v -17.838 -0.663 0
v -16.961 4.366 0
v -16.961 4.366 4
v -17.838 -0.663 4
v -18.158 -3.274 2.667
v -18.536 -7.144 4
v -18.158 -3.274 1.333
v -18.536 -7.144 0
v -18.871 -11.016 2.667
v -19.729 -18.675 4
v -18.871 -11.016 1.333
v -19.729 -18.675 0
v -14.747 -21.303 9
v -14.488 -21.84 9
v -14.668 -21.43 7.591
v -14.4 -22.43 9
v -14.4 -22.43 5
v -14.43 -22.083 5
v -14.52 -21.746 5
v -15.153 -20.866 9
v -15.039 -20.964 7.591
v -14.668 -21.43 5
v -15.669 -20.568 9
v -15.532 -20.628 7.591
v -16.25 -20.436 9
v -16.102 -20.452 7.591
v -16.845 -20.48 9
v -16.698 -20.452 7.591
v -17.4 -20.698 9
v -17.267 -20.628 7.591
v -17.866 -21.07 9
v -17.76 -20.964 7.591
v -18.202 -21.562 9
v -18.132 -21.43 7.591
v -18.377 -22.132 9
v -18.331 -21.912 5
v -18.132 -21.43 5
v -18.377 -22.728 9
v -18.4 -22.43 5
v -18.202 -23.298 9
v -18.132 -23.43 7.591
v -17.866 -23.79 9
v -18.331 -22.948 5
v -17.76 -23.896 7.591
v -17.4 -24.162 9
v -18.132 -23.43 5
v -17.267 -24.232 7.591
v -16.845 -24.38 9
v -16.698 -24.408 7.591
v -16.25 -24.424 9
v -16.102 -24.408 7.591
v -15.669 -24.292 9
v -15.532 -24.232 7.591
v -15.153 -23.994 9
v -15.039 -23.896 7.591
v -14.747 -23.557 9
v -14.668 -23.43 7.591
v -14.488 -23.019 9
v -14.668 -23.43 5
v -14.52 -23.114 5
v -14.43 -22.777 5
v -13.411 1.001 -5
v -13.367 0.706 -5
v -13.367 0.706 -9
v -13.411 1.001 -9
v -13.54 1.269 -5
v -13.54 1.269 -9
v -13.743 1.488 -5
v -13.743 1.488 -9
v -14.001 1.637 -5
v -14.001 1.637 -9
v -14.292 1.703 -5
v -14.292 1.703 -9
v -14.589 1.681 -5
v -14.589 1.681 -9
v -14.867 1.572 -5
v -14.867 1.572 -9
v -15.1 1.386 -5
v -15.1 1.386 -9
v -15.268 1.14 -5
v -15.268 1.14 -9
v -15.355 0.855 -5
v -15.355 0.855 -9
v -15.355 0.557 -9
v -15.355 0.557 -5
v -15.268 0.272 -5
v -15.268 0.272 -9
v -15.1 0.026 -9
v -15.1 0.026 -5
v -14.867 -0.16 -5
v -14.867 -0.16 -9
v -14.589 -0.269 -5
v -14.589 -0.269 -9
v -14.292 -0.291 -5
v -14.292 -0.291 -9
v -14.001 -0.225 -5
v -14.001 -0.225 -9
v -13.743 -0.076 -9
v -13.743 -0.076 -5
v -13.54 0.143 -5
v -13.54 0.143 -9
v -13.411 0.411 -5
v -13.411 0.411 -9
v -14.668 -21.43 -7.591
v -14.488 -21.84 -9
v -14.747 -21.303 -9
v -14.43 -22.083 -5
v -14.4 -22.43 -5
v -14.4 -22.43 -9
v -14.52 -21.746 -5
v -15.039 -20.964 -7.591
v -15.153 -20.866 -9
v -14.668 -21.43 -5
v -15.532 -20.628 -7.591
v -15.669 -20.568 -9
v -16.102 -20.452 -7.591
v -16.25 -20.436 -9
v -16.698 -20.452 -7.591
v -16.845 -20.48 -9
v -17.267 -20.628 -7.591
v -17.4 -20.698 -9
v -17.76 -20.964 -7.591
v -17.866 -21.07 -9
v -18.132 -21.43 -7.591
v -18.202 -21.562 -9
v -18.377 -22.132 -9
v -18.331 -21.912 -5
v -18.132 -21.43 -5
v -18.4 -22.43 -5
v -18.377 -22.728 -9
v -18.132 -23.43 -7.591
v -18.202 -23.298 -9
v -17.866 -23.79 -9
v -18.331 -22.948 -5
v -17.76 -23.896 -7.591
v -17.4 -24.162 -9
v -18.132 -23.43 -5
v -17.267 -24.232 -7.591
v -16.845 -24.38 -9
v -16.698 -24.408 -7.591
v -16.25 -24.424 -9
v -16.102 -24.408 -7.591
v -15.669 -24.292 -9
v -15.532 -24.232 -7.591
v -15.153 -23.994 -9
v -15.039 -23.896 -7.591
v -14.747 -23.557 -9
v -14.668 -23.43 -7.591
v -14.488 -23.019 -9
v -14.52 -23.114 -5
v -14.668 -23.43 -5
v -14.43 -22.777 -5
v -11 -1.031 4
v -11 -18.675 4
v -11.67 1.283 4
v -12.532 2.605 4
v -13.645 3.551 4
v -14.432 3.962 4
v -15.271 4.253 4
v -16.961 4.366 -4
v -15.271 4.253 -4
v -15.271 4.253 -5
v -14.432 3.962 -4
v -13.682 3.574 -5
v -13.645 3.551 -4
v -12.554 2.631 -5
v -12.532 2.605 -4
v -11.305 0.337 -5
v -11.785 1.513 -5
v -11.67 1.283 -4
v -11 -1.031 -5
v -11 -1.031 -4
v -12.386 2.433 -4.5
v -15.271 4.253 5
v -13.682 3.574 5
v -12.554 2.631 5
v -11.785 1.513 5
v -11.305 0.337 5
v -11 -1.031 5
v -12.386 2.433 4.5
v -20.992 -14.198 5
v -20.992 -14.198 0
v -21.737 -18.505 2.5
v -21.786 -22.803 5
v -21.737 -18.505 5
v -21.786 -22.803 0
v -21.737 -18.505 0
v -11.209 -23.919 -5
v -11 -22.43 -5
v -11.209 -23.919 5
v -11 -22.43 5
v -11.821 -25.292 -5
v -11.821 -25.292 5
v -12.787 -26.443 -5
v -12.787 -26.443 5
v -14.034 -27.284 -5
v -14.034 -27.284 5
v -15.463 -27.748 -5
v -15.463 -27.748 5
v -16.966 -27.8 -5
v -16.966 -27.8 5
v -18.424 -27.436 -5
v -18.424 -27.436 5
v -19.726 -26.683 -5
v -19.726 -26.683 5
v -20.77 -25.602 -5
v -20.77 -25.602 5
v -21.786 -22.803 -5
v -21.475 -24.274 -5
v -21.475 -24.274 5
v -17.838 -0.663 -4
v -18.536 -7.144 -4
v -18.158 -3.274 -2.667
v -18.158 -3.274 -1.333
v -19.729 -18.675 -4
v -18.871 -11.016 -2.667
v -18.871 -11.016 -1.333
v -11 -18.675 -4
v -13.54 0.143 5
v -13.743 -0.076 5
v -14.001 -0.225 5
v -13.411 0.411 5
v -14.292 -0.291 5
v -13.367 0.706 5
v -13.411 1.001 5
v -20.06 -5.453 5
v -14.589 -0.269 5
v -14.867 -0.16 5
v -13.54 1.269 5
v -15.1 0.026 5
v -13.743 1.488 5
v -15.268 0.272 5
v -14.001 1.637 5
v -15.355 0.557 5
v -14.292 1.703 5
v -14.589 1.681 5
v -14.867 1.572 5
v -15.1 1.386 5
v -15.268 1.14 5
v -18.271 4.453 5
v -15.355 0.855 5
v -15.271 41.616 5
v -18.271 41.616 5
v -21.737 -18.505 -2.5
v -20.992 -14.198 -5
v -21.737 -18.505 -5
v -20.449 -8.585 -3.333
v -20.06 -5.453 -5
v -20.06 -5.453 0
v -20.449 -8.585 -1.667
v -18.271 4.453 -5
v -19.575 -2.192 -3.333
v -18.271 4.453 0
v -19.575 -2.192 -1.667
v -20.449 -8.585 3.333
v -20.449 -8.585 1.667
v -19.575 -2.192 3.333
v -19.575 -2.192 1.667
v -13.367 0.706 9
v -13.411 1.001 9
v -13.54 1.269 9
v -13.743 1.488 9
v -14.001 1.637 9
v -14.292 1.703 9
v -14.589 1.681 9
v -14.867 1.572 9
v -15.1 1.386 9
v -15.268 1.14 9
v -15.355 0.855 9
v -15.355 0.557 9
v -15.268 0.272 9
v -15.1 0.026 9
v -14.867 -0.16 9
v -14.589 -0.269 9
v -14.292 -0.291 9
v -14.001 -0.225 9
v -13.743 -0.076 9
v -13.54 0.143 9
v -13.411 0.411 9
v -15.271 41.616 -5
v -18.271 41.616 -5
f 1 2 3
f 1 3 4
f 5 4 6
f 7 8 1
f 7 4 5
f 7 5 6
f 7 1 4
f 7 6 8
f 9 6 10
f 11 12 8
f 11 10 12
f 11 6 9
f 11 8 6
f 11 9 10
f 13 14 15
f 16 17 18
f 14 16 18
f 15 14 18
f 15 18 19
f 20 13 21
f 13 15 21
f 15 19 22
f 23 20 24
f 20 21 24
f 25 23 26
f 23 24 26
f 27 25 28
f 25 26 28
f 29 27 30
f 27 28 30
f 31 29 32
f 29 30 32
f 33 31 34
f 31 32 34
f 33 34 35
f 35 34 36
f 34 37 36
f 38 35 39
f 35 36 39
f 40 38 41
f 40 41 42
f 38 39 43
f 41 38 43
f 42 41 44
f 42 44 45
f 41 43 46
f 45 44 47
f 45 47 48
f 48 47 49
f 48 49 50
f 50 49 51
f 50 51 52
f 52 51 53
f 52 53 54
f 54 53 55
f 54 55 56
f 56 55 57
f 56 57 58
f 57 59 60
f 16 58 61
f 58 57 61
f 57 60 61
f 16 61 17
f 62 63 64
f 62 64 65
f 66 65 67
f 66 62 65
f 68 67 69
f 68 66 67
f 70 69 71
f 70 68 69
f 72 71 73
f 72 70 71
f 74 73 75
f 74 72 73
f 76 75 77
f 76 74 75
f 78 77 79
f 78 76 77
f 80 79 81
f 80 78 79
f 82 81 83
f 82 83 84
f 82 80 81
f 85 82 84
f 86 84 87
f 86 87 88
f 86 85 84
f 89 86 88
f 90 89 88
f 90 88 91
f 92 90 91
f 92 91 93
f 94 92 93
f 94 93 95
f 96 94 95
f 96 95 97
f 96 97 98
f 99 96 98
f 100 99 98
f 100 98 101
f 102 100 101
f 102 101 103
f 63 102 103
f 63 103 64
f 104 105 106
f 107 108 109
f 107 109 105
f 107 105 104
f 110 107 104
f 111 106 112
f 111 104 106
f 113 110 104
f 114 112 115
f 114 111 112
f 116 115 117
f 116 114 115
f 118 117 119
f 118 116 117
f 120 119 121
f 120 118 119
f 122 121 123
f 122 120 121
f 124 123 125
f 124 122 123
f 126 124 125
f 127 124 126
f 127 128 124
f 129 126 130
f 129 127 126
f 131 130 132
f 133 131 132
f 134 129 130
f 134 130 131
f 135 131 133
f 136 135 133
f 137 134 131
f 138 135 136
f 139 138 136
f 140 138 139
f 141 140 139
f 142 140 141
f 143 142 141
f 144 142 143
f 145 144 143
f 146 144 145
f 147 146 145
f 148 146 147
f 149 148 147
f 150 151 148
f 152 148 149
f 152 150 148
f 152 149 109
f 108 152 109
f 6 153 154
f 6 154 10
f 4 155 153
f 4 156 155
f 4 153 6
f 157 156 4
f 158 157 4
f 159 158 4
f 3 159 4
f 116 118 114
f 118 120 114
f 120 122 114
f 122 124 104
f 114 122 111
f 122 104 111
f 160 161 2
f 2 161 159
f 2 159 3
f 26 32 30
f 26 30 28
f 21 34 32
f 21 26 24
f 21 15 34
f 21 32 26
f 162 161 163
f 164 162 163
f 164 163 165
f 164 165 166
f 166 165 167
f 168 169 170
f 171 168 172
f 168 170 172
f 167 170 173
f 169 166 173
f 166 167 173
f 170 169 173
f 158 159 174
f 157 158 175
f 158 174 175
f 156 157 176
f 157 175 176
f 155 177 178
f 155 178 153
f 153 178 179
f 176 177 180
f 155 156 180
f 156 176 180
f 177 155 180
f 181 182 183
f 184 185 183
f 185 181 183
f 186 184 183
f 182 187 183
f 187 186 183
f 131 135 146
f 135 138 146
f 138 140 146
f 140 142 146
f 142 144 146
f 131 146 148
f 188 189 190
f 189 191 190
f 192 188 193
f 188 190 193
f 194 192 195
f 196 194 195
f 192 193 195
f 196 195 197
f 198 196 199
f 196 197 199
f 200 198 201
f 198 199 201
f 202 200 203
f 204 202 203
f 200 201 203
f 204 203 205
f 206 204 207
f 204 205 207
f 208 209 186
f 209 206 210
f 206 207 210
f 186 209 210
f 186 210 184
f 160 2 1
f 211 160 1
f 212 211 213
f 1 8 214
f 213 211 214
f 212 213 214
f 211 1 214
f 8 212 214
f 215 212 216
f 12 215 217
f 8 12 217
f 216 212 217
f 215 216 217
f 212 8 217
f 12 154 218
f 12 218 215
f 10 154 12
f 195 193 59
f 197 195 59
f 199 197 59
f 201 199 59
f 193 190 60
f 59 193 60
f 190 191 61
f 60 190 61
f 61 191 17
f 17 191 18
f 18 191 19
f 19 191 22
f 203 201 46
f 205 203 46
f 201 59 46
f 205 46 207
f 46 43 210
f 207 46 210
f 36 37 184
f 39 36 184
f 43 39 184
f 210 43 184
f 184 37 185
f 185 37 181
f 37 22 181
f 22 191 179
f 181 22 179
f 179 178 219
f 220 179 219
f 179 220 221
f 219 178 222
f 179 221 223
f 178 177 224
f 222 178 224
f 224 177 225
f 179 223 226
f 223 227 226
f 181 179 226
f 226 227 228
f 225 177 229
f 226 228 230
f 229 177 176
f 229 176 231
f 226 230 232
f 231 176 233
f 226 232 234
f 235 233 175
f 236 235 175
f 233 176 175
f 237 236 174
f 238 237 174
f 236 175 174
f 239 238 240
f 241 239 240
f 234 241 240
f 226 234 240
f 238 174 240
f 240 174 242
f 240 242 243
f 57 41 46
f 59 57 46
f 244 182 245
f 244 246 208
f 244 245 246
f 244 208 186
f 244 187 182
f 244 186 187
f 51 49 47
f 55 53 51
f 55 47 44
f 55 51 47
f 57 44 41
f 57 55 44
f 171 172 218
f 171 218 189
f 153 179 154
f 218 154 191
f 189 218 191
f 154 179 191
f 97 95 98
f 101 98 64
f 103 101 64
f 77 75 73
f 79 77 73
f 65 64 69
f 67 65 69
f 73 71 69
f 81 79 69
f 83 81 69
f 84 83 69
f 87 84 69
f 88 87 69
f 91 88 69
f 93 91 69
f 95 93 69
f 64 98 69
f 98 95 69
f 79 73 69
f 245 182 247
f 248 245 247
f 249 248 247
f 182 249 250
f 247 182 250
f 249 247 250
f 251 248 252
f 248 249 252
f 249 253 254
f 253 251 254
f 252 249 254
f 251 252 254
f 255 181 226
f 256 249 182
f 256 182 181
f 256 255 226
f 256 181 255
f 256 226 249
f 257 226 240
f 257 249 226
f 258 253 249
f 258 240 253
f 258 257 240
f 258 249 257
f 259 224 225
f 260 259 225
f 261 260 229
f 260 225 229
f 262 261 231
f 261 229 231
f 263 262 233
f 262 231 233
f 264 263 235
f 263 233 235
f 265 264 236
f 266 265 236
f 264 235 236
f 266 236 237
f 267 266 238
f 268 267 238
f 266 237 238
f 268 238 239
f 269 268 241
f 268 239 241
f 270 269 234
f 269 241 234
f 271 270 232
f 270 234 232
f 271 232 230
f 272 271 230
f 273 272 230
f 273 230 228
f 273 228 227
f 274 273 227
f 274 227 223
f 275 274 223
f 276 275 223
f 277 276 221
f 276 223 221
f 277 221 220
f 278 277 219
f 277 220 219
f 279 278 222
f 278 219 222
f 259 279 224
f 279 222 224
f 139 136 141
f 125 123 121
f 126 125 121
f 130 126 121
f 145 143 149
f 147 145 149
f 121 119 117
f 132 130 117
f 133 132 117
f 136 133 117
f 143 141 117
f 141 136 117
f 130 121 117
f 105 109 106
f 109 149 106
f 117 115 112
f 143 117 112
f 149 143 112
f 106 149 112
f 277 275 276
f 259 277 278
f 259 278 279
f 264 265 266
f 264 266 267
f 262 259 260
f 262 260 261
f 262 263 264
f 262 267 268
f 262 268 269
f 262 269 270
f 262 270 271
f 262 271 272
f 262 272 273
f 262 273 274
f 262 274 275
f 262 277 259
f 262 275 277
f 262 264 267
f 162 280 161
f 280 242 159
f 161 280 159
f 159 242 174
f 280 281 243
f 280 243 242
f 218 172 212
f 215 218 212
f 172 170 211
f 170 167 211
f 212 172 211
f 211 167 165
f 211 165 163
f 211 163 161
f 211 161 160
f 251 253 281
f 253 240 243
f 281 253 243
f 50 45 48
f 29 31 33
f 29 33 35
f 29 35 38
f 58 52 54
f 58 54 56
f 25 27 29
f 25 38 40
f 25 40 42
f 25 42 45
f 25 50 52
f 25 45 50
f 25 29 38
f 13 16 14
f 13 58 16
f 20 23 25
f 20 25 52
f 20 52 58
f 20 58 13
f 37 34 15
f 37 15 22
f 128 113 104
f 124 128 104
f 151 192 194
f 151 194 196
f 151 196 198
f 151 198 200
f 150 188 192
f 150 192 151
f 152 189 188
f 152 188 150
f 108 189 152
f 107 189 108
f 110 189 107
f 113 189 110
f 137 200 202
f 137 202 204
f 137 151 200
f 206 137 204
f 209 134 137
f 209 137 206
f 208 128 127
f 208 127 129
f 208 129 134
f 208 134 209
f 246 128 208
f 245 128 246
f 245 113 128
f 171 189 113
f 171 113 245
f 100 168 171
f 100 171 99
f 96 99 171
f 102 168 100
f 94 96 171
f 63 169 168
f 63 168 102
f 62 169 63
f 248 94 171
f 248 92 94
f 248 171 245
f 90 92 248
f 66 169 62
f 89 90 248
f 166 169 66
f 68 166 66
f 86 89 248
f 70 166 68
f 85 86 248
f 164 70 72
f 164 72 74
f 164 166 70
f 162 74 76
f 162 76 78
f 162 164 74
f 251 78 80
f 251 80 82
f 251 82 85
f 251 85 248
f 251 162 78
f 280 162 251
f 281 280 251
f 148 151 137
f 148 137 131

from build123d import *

# Parameters (mm, degrees)
EXTRUDE_1_DEPTH          = 5
SKETCH_3_R               = 2
SKETCH_3_R_2             = 1
EXTRUDE_2_DEPTH          = 4
EXTRUDE_2_DEPTH_BACK     = 14
CUT_EXTRUDE_1_DEPTH      = 4
SKETCH_4_W               = 2.59101906
SKETCH_4_H               = 1.951015164
SKETCH_4_H_2             = 2.185859581
CUT_EXTRUDE_2_DEPTH      = 1
CUT_EXTRUDE_2_DEPTH_BACK = 22.850089698
SKETCH_5_W               = 31.280846128
SKETCH_5_H               = 26.509191634
CUT_EXTRUDE_3_DEPTH      = 10
CUT_EXTRUDE_4_DEPTH      = 10
EXTRUDE_4_DEPTH          = 10


with BuildPart() as part:
    # 草图1 → 凸台-拉伸1 (new body, symmetric)
    with BuildSketch(Plane.XY):
        with BuildLine():
            Line((-11, -0.656322646), (-11, -22.429975294))
            ThreePointArc((-11, -22.429975294), (-16.212842401, -27.826367541), (-21.786325372, -22.803314409))
            add(Edge.make_bspline(
                [(-20.992129713, -14.197793305), (-22.083985192, -18.508547069), (-21.786325372, -22.803314409)],
                knots=[0, 0, 0, 0.849528989, 0.849528989, 0.849528989], degree=2))
            add(Edge.make_bspline(
                [(-20.992129713, -14.197793305), (-19.982477614, -1.835246339), (-16.911295032, 22.315403308), (-5.101083491, 23.268557164)],
                knots=[0.325260196, 0.325260196, 0.325260196, 0.325260196, 1, 1, 1, 1], degree=3))
            Line((-5.101083491, 23.268557164), (-5.101083491, 16.3035208))
            ThreePointArc((-5.101083491, 16.3035208), (-5.344239377, 14.111719499), (-6.061882079, 12.026508076))
            Line((-6.061882079, 12.026508076), (-10.039201412, 3.620690077))
            ThreePointArc((-10.039201412, 3.620690077), (-10.756844114, 1.535478654), (-11, -0.656322646))
        make_face()
    extrude(amount=EXTRUDE_1_DEPTH, both=True)

    # 草图3 → 凸台-拉伸2 (add, two sides)
    with BuildSketch(Plane.XY.offset(5)) as extrude_2_sk:
        with Locations((-16.399623741, -22.429975294)):
            Circle(SKETCH_3_R)
        with Locations((-14.366531857, 0.706079338)):
            Circle(SKETCH_3_R_2)
    extrude(amount=EXTRUDE_2_DEPTH)
    extrude(extrude_2_sk.sketch, amount=-EXTRUDE_2_DEPTH_BACK)

    # 草图2 → 切除-拉伸1 (cut, symmetric)
    with BuildSketch(Plane.XY):
        with BuildLine():
            Line((-14.16063588, 12.808117781), (14.16063588, 12.808117781))
            add(Edge.make_bspline(
                [(14.16063588, 12.808117781), (18.7957473, 3.012389753), (18.151937314, -8.213759494), (19.7286529, -18.675237718)],
                knots=[0, 0, 0, 0, 1, 1, 1, 1], degree=3))
            Line((19.7286529, -18.675237718), (-19.7286529, -18.675237718))
            add(Edge.make_bspline(
                [(-14.16063588, 12.808117781), (-18.7957473, 3.012389753), (-18.151937314, -8.213759494), (-19.7286529, -18.675237718)],
                knots=[0, 0, 0, 0, 1, 1, 1, 1], degree=3))
        make_face()
    extrude(amount=CUT_EXTRUDE_1_DEPTH, both=True, mode=Mode.SUBTRACT)

    # 草图4 → 切除-拉伸2 (cut, two sides)
    with BuildSketch(Plane(origin=(0, 0, 0), x_dir=(0, 0, -1), z_dir=(1, 0, 0))) as cut_extrude_2_sk:
        with Locations((-6.29550953, -20.454467712)):
            Rectangle(SKETCH_4_W, SKETCH_4_H)
        with Locations((-6.29550953, -24.522905085)):
            Rectangle(SKETCH_4_W, SKETCH_4_H_2)
        with Locations((6.29550953, -24.522905085)):
            Rectangle(SKETCH_4_W, SKETCH_4_H_2)
        with Locations((6.29550953, -20.454467712)):
            Rectangle(SKETCH_4_W, SKETCH_4_H)
    extrude(amount=CUT_EXTRUDE_2_DEPTH, mode=Mode.SUBTRACT)
    extrude(cut_extrude_2_sk.sketch, amount=-CUT_EXTRUDE_2_DEPTH_BACK, mode=Mode.SUBTRACT)

    # 草图5 → 切除-拉伸3 (cut)
    with BuildSketch(Plane.XY.offset(5)):
        with Locations((-12.035980348, 17.707965105)):
            Rectangle(SKETCH_5_W, SKETCH_5_H)
    extrude(amount=-CUT_EXTRUDE_3_DEPTH, mode=Mode.SUBTRACT)

    # 草图6 → 切除-拉伸4 (cut)
    with BuildSketch(Plane.XY.offset(5)):
        with BuildLine():
            Line((-11, -1.030772695), (-7.289425252, 0))
            Line((-7.289425252, 0), (-6.627618858, 7.054774986))
            Line((-6.627618858, 7.054774986), (-15.000908449, 5.846258962))
            Line((-15.000908449, 5.846258962), (-16.238198664, 4.453369288))
            add(Edge.make_bspline(
                [(-16.238198664, 4.453369288), (-11.717955923, 3.797110984), (-11, -1.030772695)],
                knots=[0, 0, 0, 1, 1, 1], degree=2))
        make_face()
    extrude(amount=-CUT_EXTRUDE_4_DEPTH, mode=Mode.SUBTRACT)

    # 草图7 → 凸台-拉伸4 (add)
    with BuildSketch(Plane.XY.offset(5)):
        Polygon((-18.271249604, 4.453369288), (-18.271249604, 41.616361527), (-15.271249597, 41.616361527), (-15.271249604, 4.25345908), align=None)
    extrude(amount=-EXTRUDE_4_DEPTH)


solid = part.part
